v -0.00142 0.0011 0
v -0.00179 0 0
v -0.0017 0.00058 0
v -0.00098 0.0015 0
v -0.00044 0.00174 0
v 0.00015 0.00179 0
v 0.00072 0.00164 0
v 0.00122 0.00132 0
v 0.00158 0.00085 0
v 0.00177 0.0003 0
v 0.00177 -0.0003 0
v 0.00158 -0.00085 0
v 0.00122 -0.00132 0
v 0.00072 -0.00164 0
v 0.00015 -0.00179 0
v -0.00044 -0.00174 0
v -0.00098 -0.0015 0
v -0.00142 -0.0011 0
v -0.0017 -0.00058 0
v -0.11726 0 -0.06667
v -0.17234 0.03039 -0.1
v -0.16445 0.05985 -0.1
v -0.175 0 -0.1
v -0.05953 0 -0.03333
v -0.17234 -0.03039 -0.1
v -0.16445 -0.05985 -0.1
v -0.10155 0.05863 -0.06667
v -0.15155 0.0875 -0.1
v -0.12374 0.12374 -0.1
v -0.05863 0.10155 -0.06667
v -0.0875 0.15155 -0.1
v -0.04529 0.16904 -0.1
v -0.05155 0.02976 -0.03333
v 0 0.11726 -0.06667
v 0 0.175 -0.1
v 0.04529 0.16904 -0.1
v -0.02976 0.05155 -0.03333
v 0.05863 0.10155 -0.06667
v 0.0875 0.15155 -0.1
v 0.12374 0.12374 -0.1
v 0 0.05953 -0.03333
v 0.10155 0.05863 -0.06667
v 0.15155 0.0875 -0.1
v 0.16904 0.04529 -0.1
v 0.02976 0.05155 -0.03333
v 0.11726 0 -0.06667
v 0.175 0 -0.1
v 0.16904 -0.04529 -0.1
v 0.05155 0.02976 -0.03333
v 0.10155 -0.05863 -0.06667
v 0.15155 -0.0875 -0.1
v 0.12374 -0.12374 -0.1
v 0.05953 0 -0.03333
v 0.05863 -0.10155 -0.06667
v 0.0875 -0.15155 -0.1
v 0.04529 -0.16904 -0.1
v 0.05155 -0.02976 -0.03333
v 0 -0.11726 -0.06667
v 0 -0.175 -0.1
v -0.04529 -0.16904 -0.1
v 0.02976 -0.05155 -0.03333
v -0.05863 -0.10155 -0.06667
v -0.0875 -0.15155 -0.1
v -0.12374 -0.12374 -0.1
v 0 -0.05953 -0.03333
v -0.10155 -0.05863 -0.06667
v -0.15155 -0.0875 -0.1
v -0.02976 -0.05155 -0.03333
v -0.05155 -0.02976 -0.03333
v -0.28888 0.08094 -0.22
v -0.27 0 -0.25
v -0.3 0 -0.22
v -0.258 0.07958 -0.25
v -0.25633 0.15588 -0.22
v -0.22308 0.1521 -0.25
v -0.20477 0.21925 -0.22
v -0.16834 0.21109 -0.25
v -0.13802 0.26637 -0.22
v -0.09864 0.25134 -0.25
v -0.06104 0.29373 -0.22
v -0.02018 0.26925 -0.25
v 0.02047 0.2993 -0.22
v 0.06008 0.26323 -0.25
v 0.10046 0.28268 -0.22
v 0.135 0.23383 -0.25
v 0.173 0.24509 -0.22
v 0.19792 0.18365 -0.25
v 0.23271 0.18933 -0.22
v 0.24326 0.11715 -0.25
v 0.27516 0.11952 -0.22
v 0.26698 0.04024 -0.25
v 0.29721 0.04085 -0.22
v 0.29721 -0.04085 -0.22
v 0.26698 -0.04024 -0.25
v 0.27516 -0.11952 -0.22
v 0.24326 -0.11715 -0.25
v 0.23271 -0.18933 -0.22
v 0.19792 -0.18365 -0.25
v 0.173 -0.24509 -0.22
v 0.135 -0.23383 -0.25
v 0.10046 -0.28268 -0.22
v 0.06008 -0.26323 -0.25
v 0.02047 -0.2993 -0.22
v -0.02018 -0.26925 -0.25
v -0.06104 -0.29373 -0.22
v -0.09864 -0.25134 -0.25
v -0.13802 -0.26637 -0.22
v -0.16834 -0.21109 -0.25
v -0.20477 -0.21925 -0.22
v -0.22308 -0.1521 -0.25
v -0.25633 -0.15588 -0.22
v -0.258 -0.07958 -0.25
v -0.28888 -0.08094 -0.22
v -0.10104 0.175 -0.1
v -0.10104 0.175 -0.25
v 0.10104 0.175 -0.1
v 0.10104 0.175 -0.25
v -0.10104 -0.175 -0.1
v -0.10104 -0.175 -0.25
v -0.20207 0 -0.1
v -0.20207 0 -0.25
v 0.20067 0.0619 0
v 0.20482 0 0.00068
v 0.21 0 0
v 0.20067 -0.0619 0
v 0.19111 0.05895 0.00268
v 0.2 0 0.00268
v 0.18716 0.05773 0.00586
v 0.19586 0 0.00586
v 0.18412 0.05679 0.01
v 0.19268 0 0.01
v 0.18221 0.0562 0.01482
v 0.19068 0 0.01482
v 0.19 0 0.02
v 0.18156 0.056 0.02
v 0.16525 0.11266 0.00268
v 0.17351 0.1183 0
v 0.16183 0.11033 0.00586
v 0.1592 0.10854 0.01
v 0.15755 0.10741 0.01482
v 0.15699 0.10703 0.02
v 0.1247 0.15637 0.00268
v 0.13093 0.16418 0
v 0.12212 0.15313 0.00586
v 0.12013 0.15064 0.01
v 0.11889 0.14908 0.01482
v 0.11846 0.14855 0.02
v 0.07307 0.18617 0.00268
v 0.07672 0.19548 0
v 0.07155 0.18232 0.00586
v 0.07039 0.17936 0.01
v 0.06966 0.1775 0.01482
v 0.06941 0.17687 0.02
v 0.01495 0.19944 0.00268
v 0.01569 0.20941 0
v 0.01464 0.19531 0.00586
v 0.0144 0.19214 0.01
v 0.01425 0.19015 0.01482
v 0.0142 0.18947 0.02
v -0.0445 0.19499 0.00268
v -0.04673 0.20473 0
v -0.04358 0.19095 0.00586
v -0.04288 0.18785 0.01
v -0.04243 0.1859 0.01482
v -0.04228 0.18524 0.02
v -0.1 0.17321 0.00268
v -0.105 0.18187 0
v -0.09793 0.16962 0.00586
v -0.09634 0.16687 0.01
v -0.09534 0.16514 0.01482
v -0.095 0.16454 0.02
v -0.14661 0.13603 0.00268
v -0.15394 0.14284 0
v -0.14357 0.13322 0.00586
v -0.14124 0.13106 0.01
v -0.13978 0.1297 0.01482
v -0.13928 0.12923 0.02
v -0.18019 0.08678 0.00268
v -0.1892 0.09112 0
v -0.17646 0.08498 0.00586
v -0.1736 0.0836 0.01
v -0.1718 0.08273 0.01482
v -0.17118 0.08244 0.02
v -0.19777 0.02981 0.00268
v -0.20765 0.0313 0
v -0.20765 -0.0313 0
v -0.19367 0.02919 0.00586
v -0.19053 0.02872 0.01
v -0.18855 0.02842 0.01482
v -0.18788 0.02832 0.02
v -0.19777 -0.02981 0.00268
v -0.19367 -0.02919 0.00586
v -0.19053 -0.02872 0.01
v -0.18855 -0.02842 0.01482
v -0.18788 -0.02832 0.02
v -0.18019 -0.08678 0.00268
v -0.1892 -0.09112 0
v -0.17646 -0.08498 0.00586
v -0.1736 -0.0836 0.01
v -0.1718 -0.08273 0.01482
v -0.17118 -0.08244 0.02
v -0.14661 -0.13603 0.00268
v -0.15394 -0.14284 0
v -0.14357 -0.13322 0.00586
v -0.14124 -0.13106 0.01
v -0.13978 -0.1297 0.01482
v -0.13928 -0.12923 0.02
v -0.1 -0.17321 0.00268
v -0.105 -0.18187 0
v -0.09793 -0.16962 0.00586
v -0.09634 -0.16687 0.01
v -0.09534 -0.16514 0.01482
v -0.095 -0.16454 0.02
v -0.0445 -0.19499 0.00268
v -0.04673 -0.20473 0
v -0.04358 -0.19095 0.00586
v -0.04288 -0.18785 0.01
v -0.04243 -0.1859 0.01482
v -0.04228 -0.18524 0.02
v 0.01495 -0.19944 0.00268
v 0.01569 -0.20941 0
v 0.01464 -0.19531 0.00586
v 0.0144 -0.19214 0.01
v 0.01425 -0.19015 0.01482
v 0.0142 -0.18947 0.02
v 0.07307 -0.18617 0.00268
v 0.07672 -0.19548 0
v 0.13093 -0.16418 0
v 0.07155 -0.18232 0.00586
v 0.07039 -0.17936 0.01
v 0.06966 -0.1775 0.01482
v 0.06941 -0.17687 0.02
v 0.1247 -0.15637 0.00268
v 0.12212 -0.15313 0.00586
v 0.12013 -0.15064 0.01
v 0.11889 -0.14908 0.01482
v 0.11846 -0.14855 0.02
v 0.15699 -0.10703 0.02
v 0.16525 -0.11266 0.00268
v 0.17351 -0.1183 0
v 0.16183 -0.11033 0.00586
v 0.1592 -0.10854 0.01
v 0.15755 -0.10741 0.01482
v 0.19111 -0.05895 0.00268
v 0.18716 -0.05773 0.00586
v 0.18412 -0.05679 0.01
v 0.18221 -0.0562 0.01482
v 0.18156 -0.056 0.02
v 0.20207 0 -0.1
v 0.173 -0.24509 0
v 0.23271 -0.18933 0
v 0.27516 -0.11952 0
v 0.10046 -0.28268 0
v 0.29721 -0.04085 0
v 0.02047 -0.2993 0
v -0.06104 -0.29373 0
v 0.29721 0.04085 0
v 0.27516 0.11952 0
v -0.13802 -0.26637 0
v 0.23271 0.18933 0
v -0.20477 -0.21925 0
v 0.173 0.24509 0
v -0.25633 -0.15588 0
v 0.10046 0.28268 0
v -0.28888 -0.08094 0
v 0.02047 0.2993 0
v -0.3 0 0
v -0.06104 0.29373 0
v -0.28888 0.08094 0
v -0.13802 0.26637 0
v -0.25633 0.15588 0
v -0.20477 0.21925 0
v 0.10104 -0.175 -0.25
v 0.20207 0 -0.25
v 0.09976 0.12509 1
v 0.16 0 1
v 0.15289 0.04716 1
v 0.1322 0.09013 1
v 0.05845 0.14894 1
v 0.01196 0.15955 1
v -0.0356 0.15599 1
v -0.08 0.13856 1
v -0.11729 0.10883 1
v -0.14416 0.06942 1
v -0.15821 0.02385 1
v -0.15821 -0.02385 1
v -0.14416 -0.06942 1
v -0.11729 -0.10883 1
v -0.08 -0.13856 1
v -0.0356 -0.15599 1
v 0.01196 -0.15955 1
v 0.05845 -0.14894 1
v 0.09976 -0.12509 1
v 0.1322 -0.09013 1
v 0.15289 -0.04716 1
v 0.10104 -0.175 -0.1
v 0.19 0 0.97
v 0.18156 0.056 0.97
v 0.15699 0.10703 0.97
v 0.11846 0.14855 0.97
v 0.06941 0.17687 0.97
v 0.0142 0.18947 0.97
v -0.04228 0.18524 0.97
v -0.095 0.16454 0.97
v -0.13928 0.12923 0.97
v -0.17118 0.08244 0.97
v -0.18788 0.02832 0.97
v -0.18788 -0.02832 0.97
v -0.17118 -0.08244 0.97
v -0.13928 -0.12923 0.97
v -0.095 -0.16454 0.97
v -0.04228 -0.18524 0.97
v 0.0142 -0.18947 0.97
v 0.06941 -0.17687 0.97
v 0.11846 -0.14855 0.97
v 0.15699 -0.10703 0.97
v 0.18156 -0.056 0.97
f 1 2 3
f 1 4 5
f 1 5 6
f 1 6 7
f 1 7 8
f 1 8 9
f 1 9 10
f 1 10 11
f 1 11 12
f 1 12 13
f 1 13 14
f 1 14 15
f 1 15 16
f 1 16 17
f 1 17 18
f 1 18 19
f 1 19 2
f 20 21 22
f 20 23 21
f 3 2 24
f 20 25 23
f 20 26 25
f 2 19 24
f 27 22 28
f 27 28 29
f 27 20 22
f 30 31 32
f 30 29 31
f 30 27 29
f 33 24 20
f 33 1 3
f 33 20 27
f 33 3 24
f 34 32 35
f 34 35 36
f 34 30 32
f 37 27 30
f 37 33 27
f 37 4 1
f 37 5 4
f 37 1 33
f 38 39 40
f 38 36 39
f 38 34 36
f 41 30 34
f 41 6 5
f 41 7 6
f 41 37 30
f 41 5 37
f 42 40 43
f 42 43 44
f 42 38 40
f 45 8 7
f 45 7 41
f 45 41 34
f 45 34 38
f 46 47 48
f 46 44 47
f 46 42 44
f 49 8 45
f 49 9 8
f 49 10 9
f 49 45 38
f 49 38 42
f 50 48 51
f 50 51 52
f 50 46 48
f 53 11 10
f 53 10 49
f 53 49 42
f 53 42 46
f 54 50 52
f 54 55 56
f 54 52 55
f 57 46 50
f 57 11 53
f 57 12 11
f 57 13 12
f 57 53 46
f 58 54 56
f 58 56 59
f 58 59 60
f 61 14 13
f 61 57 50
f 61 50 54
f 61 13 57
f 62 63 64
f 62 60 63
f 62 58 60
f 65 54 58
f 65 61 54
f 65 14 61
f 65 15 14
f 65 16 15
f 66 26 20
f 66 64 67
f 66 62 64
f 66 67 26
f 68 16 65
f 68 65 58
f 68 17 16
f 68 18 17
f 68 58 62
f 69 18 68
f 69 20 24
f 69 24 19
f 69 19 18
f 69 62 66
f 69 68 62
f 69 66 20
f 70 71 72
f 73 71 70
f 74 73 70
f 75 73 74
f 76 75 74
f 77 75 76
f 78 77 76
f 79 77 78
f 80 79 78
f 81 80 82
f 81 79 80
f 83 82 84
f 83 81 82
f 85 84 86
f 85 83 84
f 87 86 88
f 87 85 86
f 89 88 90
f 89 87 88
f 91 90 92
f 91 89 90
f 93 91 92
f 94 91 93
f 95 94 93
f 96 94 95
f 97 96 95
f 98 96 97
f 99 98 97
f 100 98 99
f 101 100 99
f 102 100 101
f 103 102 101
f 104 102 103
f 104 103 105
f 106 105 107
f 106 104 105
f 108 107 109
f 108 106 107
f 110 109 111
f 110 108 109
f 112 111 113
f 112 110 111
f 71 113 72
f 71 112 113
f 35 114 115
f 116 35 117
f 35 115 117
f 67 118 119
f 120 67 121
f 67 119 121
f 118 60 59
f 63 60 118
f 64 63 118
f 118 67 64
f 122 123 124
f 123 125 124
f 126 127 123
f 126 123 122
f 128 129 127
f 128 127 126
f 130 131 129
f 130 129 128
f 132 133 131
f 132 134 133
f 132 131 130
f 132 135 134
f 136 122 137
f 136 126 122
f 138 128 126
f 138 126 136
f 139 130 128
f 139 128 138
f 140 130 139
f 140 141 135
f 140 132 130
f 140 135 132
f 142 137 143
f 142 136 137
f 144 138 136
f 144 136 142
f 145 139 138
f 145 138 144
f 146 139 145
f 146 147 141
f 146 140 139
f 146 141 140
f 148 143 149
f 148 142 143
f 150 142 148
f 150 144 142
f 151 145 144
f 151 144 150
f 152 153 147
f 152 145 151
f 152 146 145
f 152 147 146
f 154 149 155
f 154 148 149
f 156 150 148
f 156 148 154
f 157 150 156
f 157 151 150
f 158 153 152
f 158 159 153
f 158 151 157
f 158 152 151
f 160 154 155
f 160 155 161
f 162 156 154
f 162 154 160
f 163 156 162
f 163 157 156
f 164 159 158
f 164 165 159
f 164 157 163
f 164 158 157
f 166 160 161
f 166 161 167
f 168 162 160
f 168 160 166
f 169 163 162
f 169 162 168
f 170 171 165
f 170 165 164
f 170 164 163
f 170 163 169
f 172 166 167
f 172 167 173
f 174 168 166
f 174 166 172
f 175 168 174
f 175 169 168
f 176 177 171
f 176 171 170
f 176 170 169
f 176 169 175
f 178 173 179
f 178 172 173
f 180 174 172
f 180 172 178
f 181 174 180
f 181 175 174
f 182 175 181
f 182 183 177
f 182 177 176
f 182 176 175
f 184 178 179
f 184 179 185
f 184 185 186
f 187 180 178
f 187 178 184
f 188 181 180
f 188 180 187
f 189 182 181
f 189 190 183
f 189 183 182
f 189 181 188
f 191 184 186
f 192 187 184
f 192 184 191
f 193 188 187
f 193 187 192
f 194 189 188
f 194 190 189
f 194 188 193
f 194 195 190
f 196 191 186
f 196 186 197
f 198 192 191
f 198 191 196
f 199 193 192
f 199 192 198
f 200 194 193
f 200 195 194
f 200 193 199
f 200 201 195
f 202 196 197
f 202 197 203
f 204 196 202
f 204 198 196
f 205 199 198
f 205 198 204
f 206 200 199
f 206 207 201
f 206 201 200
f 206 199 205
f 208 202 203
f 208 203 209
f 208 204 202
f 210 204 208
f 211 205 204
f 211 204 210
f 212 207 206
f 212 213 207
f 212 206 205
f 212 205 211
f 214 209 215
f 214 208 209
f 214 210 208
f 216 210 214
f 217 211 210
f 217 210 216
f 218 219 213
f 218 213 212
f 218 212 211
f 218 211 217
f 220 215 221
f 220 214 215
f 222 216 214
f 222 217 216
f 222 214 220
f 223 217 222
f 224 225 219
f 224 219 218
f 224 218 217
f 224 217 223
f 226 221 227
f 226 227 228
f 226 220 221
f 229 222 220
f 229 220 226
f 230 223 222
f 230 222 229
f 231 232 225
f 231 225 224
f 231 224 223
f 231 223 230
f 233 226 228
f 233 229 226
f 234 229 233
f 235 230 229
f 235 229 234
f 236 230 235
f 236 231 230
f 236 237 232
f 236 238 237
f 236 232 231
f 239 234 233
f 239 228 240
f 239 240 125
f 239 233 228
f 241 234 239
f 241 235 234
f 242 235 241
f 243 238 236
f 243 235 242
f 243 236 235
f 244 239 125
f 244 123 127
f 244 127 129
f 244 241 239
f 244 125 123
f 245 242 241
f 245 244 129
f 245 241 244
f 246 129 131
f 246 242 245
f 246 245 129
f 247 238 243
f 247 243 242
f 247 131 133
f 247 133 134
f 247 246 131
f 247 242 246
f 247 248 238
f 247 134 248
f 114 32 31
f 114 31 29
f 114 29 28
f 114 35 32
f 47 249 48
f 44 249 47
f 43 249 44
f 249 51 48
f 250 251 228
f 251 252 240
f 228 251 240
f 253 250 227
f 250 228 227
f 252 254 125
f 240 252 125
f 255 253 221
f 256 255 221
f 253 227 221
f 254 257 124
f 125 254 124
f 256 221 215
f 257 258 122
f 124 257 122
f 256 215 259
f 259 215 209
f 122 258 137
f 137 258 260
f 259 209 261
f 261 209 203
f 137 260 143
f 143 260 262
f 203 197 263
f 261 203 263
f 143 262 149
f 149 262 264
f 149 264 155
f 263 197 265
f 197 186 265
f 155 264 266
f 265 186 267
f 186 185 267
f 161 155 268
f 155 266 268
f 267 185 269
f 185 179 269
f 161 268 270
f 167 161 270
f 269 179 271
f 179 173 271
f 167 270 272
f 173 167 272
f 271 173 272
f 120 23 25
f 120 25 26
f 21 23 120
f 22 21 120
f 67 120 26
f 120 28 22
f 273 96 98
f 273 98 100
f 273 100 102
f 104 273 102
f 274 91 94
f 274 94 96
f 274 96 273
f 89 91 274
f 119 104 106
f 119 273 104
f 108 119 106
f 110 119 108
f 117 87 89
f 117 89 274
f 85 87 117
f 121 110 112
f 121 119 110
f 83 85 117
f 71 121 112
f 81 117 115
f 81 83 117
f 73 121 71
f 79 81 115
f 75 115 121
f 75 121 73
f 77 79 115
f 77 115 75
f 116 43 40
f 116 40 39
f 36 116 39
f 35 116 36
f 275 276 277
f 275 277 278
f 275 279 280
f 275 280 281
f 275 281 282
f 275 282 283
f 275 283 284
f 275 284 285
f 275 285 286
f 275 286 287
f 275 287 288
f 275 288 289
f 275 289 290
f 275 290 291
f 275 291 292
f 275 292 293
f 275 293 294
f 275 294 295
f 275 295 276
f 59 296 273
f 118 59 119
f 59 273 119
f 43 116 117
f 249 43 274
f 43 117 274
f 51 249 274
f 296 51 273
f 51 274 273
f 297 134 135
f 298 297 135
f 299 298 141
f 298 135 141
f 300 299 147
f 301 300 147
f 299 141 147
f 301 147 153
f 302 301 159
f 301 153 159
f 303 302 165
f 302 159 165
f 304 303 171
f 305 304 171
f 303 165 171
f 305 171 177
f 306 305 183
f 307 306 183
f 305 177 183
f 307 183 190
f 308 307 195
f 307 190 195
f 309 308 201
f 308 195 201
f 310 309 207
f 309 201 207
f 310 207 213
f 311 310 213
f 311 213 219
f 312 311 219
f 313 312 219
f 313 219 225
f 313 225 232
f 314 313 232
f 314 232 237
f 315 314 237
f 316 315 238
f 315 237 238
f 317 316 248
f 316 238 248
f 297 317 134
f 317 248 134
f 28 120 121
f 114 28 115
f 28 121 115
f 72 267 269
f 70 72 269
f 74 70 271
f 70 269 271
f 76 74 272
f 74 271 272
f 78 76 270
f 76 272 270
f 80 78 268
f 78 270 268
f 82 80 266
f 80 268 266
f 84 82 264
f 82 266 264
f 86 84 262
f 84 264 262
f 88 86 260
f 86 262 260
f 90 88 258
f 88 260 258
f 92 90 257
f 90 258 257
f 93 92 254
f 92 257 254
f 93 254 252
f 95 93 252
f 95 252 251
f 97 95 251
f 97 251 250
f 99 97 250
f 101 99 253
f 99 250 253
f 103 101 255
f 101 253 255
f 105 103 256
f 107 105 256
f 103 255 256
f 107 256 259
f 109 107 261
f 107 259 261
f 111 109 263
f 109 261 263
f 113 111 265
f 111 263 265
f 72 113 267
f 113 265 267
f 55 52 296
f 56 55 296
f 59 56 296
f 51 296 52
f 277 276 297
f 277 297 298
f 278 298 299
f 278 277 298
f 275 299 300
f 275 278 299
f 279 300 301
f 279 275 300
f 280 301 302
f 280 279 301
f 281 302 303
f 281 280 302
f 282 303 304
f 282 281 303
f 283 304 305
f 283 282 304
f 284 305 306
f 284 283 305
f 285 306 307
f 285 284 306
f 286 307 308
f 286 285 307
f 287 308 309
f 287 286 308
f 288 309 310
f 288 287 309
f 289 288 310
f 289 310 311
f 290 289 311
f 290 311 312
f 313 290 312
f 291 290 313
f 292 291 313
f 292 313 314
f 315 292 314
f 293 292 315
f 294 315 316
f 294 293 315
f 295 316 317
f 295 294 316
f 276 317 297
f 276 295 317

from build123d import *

# Parameters (mm, degrees)
SKETCH1_R           = 0.19
BOSS_EXTRUDE1_DEPTH = 1
SKETCH2_R           = 0.3
BOSS_EXTRUDE2_DEPTH = 0.25
CHAMFER1_SIZE       = 0.03
FILLET1_R           = 0.02
CUT_EXTRUDE1_DEPTH  = 0.15
SKETCH4_R           = 0.175
CUT_EXTRUDE2_DEPTH  = 0.1
CUT_EXTRUDE2_TAPER  = 60


with BuildPart() as part:
    # Sketch1 → Boss-Extrude1 (new body)
    with BuildSketch(Plane.XY):
        Circle(SKETCH1_R)
    extrude(amount=BOSS_EXTRUDE1_DEPTH)

    # Sketch2 → Boss-Extrude2 (add)
    with BuildSketch(Plane(origin=(0, 0, 0), x_dir=(-1, 0, 0), z_dir=(0, 0, -1))):
        Circle(SKETCH2_R)
    extrude(amount=BOSS_EXTRUDE2_DEPTH)

    # Chamfer1
    chamfer1_edges = [part.edges().sort_by_distance(p)[0] for p in [
        (-0.19, 0, 1),
        (0.3, 0, -0.25),
    ]]
    chamfer(chamfer1_edges, length=CHAMFER1_SIZE)

    # Fillet1
    fillet1_edges = [part.edges().sort_by_distance(p)[0] for p in [
        (-0.19, 0, 0),
    ]]
    fillet(fillet1_edges, radius=FILLET1_R)

    # Sketch3 → Cut-Extrude1 (cut)
    with BuildSketch(Plane(origin=(0, 0, -0.25), x_dir=(-1, 0, 0), z_dir=(0, 0, -1))):
        Polygon((0.202072594, 0), (0.101036297, 0.175), (-0.101036297, 0.175), (-0.202072594, 0), (-0.101036297, -0.175), (0.101036297, -0.175), align=None)
    extrude(amount=-CUT_EXTRUDE1_DEPTH, mode=Mode.SUBTRACT)

    # Sketch4 → Cut-Extrude2 (cut)
    with BuildSketch(Plane(origin=(0, 0, -0.1), x_dir=(-1, 0, 0), z_dir=(0, 0, -1))):
        Circle(SKETCH4_R)
    extrude(amount=-CUT_EXTRUDE2_DEPTH, taper=CUT_EXTRUDE2_TAPER, mode=Mode.SUBTRACT)


solid = part.part
